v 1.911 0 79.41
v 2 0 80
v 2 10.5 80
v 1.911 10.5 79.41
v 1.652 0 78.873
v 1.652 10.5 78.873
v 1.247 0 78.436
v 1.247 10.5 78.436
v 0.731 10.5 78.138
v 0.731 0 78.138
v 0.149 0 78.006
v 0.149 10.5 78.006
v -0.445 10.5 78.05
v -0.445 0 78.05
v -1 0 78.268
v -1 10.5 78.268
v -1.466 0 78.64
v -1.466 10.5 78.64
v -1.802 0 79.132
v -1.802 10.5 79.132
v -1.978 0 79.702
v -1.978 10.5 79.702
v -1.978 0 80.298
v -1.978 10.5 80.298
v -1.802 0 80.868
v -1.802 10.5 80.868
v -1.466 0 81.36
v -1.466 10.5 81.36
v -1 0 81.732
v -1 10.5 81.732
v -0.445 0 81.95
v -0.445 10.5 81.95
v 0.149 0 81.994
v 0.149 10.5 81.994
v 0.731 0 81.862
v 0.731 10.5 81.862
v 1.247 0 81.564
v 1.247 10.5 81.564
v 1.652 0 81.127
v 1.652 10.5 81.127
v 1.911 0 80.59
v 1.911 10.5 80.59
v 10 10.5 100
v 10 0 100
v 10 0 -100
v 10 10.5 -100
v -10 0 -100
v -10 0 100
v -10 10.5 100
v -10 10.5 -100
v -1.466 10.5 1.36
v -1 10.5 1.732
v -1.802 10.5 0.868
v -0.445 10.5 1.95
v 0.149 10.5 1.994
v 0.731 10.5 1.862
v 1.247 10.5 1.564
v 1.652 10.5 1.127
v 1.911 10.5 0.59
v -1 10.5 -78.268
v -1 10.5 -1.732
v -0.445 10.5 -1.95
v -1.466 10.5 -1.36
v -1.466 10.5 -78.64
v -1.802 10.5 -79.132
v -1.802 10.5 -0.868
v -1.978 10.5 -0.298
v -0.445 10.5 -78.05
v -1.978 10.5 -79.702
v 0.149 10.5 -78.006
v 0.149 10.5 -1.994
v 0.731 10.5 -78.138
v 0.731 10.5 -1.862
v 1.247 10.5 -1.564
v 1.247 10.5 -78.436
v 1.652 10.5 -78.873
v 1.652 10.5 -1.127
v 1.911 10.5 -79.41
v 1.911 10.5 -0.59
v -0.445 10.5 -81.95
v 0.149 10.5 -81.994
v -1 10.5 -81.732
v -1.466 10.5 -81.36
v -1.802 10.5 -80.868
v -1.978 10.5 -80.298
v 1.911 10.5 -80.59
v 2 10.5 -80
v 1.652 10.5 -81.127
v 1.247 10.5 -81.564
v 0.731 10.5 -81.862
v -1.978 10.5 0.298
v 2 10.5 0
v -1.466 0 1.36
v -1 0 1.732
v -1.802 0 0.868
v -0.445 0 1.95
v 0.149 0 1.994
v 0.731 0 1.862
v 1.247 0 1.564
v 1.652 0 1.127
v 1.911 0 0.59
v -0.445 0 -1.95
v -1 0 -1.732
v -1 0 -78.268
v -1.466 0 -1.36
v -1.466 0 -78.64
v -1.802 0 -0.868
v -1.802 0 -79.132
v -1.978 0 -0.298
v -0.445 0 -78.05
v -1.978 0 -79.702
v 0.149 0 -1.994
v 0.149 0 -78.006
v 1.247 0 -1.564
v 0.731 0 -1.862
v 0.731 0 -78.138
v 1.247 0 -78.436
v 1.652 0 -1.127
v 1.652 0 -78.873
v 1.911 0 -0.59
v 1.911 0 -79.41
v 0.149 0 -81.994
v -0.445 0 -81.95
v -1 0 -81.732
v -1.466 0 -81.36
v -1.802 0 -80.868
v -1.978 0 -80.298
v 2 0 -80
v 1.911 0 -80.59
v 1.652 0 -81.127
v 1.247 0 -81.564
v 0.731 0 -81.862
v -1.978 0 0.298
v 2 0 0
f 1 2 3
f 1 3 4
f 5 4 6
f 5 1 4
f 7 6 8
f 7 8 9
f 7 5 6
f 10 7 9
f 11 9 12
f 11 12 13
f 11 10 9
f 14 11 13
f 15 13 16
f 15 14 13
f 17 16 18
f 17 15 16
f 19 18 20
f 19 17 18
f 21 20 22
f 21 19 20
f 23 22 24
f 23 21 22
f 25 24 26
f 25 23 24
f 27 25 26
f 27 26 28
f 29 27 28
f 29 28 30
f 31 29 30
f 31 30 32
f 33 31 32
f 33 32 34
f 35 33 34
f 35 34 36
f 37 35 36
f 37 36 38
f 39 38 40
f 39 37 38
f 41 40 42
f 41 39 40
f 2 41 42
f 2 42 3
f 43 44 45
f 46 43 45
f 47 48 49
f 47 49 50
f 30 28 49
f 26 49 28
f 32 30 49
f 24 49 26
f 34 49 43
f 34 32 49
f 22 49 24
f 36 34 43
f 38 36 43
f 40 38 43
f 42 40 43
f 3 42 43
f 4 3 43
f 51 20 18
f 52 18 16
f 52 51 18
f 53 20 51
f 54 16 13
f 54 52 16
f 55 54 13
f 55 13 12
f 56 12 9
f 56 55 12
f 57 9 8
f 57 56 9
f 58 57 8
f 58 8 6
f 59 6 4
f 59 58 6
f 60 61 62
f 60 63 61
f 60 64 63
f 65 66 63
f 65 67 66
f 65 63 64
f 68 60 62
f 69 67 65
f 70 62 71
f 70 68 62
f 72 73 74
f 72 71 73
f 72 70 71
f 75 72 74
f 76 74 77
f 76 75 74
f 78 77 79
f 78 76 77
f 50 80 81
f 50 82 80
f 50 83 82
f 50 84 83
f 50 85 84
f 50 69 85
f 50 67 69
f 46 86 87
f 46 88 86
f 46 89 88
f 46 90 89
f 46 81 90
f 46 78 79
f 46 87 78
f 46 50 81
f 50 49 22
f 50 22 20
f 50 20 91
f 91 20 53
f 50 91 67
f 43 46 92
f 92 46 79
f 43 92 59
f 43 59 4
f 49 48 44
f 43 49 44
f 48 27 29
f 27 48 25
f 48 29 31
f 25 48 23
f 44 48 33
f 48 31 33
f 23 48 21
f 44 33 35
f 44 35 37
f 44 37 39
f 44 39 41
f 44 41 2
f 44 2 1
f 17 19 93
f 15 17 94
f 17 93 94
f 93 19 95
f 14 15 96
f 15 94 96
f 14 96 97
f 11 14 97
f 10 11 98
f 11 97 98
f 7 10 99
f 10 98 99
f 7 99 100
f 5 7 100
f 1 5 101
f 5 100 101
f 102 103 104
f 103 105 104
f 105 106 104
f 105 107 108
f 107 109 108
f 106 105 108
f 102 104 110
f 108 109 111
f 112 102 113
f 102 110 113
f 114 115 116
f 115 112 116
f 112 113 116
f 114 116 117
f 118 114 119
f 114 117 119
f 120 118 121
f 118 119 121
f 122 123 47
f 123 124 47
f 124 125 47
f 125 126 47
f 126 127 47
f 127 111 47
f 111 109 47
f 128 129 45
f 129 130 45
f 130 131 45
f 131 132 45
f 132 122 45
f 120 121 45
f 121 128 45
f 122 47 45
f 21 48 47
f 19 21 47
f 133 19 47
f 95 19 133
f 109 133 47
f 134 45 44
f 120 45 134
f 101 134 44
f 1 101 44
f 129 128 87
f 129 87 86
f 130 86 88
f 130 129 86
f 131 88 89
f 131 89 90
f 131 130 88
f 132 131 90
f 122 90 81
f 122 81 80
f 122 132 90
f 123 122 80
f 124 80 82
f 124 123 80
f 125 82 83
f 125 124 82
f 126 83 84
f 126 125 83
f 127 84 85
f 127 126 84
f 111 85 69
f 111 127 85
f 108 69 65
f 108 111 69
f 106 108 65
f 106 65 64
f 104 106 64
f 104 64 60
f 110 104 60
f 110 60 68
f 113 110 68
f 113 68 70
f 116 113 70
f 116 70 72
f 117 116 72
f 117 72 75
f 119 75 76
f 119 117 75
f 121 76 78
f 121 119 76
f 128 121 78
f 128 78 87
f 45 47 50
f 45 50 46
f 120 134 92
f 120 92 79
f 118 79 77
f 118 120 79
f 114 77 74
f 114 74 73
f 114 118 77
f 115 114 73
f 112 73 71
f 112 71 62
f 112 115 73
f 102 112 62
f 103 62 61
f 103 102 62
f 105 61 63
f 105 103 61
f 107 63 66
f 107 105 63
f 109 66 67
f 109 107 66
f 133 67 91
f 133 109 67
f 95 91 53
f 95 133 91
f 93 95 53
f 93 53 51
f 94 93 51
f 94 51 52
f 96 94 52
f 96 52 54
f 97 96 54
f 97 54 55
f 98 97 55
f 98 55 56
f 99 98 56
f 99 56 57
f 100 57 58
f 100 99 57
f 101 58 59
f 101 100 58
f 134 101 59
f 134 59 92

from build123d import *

# Parameters (mm, degrees)
SKETCH1_W           = 20
SKETCH1_H           = 200
SKETCH1_R           = 2
BOSS_EXTRUDE1_DEPTH = 10.5


with BuildPart() as part:
    # Sketch1 → Boss-Extrude1 (new body)
    with BuildSketch(Plane(origin=(0, 0, 0), x_dir=(1, 0, 0), z_dir=(0, 1, 0))):
        Rectangle(SKETCH1_W, SKETCH1_H)
        with Locations((0, 80)):
            Circle(SKETCH1_R, mode=Mode.SUBTRACT)
        Circle(SKETCH1_R, mode=Mode.SUBTRACT)
        with Locations((0, -80)):
            Circle(SKETCH1_R, mode=Mode.SUBTRACT)
    extrude(amount=BOSS_EXTRUDE1_DEPTH)


solid = part.part
